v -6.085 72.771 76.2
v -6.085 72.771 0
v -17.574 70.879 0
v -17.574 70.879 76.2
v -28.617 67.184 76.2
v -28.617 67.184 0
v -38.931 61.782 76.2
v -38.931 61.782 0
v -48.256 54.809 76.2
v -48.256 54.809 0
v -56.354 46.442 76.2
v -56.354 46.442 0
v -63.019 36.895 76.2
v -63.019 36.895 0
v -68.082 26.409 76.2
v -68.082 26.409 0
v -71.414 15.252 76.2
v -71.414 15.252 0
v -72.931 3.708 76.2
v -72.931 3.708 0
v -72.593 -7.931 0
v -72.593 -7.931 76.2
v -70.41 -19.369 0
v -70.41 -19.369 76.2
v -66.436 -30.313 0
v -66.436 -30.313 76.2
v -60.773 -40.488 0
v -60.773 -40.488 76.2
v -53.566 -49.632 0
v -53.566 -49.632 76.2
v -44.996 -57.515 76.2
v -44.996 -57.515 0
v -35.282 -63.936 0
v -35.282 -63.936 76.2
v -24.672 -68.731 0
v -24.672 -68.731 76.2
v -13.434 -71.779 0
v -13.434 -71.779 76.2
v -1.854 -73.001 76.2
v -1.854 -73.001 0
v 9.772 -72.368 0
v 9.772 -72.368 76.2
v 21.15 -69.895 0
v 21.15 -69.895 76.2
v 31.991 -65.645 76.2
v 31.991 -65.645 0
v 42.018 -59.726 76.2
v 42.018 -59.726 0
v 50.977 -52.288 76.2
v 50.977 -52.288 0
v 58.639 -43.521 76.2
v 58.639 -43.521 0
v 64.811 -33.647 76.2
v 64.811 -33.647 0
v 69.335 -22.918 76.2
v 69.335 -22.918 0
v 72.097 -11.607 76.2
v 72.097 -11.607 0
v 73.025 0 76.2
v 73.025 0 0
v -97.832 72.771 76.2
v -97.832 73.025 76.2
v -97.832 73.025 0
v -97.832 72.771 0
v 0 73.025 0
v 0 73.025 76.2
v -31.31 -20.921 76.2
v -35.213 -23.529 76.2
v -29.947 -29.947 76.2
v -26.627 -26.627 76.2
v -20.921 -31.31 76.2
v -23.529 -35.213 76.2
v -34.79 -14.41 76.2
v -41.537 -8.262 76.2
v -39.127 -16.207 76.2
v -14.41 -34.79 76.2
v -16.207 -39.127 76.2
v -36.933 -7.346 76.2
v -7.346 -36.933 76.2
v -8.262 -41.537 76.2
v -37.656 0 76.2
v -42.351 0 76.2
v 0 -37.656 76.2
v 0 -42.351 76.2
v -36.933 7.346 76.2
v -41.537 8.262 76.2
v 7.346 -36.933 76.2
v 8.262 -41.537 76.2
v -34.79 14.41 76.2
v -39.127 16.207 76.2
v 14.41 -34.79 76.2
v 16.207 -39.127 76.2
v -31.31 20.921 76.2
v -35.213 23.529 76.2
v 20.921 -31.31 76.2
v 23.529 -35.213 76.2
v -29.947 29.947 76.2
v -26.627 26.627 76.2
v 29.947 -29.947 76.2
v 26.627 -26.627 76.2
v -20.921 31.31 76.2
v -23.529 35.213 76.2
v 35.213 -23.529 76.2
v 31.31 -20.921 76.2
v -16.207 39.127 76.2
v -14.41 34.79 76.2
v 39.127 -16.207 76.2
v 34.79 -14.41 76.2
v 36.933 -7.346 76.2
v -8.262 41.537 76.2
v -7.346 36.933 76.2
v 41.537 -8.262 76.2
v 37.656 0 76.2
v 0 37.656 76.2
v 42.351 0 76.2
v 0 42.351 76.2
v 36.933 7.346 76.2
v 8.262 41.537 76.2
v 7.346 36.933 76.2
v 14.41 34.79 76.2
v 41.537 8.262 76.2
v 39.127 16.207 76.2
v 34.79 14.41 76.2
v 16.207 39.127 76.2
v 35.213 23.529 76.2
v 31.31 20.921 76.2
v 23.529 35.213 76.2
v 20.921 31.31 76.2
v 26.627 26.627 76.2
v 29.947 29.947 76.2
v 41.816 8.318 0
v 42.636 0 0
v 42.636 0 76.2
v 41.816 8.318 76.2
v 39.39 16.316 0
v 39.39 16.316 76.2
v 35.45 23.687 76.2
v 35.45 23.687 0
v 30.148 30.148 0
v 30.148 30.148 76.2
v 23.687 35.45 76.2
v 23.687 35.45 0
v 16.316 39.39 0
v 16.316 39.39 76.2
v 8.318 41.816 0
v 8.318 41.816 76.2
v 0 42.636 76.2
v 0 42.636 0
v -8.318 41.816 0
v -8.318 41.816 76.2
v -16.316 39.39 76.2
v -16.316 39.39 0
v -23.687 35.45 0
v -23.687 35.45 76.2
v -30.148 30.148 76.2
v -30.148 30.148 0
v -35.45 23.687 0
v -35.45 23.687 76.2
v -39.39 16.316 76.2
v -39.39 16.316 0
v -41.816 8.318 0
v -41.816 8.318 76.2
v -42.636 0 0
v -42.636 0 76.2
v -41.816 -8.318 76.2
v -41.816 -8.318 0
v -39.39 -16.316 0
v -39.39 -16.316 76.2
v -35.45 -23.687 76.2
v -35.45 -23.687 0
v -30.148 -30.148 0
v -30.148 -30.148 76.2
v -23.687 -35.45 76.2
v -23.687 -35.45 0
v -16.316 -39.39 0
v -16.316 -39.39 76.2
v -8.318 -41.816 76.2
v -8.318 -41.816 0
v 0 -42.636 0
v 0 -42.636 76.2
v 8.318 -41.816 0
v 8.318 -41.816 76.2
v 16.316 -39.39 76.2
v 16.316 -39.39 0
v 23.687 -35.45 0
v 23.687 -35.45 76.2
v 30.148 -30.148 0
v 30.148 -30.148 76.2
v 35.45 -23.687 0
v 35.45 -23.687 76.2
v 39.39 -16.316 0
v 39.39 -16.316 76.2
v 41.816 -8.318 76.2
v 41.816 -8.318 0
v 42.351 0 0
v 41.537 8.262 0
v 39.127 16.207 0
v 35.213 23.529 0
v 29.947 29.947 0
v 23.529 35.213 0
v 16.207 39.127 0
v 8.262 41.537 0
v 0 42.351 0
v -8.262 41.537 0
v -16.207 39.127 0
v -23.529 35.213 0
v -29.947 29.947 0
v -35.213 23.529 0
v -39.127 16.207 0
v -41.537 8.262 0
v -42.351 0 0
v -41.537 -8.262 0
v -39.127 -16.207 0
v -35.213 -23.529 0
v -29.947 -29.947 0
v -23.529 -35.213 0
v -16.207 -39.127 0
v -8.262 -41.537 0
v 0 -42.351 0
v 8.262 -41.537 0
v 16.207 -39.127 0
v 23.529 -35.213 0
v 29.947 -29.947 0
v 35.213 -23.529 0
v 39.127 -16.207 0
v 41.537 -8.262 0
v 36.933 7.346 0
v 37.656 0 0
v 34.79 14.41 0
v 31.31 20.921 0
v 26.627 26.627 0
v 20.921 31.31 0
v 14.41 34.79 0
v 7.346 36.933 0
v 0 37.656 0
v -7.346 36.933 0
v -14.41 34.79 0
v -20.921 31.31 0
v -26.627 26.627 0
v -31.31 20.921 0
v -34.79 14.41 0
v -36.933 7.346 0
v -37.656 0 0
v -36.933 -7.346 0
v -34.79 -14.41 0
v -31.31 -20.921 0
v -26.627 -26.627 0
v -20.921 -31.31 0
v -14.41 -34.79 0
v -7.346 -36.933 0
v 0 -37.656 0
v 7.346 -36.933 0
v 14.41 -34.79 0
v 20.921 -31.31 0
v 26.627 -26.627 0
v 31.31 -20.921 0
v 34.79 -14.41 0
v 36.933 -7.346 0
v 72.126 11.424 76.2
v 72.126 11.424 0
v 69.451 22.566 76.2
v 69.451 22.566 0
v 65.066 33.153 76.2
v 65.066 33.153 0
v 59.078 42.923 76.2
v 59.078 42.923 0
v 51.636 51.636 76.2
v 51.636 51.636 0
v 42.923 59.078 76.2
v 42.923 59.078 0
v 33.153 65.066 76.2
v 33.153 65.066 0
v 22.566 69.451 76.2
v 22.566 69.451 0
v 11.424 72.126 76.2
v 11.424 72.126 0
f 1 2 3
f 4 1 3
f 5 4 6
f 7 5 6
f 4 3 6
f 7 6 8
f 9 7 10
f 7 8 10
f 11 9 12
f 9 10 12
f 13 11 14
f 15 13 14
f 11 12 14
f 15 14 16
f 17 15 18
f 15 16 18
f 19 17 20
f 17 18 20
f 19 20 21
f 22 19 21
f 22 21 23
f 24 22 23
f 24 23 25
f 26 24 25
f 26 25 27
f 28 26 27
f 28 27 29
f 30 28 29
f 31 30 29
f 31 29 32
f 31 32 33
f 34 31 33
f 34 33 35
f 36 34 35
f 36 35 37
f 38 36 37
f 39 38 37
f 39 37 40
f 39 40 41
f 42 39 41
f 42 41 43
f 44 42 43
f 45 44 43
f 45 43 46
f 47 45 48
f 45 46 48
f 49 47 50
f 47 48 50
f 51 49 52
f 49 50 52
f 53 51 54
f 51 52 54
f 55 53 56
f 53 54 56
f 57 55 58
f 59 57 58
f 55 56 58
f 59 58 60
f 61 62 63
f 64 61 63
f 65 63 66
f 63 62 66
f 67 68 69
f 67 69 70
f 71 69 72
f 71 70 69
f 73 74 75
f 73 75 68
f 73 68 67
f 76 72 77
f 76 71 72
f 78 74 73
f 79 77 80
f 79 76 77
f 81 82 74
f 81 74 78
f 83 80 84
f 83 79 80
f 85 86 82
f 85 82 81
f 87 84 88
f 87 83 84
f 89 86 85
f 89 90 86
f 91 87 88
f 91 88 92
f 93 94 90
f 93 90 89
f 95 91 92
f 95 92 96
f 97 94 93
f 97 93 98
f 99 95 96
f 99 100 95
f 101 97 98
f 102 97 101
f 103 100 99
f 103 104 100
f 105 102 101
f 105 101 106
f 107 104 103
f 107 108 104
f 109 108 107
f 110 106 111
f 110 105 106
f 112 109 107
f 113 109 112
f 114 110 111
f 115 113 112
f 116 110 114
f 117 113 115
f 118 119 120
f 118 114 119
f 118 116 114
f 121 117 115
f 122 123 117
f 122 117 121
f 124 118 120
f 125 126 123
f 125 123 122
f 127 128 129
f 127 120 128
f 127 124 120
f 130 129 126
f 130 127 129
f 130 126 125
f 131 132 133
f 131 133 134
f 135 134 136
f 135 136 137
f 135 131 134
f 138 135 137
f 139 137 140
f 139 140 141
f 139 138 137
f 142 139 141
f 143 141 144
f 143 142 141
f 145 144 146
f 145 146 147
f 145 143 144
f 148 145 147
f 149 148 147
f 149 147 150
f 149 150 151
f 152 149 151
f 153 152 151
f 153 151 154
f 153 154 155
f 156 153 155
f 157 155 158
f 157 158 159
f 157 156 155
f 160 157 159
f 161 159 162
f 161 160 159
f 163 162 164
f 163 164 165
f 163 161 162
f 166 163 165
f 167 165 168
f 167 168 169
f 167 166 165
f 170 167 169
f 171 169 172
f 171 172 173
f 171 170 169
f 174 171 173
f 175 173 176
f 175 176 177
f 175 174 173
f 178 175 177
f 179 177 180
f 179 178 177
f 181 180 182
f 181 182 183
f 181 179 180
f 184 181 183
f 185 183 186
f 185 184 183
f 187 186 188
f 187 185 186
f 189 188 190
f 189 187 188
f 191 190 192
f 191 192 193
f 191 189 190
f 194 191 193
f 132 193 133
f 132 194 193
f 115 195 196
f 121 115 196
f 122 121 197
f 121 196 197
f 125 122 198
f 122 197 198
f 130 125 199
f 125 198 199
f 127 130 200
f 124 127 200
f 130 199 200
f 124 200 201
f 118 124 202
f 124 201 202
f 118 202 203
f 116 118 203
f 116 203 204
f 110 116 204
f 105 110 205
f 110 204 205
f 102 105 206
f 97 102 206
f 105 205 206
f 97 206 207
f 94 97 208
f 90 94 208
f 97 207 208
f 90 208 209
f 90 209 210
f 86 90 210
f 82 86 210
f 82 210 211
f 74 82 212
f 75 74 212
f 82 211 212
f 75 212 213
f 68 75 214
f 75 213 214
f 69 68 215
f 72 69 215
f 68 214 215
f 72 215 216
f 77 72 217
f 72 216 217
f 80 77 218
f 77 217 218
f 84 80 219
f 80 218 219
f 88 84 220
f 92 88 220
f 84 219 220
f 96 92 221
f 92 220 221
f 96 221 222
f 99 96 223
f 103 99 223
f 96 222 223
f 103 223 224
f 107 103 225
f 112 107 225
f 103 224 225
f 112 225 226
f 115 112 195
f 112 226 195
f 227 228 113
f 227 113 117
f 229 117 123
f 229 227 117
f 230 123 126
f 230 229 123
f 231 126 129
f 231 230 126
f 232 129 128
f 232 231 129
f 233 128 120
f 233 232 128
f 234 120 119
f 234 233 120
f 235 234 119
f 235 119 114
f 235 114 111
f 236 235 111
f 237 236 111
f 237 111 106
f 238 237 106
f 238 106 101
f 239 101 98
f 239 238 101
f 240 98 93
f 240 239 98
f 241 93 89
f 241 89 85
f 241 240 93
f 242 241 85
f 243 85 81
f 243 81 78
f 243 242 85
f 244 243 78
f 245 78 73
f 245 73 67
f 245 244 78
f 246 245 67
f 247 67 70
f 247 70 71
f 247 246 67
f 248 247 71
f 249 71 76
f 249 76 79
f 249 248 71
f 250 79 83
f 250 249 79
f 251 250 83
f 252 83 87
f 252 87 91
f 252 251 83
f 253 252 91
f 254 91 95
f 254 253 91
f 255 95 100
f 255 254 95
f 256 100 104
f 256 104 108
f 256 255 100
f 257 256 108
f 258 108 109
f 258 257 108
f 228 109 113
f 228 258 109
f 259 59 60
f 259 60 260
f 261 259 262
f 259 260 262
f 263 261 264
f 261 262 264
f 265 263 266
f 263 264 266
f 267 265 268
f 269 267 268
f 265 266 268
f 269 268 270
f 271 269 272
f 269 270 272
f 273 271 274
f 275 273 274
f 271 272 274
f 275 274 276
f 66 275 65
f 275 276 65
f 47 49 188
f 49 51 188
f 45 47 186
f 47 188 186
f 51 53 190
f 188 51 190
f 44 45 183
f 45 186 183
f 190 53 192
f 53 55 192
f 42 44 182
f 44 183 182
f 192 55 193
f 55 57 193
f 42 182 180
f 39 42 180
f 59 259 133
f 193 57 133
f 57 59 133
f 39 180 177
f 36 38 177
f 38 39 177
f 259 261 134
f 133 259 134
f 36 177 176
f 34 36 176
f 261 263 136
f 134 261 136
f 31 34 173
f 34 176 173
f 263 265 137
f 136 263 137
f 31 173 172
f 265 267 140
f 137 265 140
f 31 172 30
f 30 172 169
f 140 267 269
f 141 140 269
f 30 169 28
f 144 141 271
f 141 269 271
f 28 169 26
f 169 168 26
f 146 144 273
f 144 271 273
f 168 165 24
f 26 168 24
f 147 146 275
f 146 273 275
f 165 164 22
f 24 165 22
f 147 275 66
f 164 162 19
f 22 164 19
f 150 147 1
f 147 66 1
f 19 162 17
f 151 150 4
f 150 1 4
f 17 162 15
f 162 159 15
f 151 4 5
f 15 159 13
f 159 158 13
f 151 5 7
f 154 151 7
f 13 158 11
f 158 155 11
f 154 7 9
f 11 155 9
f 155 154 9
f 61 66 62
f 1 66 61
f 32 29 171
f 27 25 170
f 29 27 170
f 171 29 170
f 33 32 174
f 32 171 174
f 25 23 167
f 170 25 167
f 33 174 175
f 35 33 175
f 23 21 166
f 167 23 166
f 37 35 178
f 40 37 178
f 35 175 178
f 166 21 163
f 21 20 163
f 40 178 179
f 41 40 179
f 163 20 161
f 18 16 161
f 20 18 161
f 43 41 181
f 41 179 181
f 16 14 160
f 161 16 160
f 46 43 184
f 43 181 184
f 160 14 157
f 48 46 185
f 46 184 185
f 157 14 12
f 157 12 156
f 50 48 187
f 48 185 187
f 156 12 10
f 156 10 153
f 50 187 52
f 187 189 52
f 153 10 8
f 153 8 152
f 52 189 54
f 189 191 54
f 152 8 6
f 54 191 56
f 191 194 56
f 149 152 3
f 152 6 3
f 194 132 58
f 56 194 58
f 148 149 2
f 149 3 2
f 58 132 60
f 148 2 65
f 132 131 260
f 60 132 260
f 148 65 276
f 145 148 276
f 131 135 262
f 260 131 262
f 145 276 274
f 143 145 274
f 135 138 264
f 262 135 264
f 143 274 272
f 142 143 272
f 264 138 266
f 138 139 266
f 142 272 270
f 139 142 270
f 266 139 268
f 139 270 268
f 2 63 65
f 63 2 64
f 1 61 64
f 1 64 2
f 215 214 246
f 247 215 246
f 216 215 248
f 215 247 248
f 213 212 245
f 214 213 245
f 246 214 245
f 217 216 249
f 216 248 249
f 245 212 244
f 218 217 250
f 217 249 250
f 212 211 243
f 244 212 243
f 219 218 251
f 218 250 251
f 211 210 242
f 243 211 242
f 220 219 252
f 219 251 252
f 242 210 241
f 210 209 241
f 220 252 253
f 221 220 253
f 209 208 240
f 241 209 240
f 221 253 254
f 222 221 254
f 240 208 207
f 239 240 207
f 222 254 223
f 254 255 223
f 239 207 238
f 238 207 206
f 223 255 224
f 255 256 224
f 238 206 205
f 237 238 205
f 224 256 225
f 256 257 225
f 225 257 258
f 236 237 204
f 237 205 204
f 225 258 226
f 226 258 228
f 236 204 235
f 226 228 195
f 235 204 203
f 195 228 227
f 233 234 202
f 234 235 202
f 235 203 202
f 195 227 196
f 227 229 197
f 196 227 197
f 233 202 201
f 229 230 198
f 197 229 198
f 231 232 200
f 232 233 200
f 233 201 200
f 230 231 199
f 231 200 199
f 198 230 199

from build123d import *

# Parameters (mm, degrees)
F0_R     = 73.025
F0_R_2   = 42.635722
F1_DEPTH = 76.2
F2_R     = 42.350853
F2_R_2   = 37.656168
F3_DEPTH = 76.2
F6_DEPTH = 0.254


with BuildPart() as f1:
    # F0 (on Top) → F1 (new body)
    with BuildSketch(Plane.XY):
        Circle(F0_R)
        Circle(F0_R_2, mode=Mode.SUBTRACT)
    extrude(amount=F1_DEPTH)

    # F5 (on offset) → F6 (join)
    with BuildSketch(Plane.XZ.offset(-73.025)):
        Polygon((-97.832054, 0), (0, 0), (0, 76.2), (-73.025, 76.2), (-97.832054, 76.2), align=None)
    extrude(amount=F6_DEPTH)


with BuildPart() as f3:
    # F2 (on Top) → F3 (new body)
    with BuildSketch(Plane.XY):
        Circle(F2_R)
        Circle(F2_R_2, mode=Mode.SUBTRACT)
    extrude(amount=F3_DEPTH)


solid = Compound([f1.part, f3.part])
